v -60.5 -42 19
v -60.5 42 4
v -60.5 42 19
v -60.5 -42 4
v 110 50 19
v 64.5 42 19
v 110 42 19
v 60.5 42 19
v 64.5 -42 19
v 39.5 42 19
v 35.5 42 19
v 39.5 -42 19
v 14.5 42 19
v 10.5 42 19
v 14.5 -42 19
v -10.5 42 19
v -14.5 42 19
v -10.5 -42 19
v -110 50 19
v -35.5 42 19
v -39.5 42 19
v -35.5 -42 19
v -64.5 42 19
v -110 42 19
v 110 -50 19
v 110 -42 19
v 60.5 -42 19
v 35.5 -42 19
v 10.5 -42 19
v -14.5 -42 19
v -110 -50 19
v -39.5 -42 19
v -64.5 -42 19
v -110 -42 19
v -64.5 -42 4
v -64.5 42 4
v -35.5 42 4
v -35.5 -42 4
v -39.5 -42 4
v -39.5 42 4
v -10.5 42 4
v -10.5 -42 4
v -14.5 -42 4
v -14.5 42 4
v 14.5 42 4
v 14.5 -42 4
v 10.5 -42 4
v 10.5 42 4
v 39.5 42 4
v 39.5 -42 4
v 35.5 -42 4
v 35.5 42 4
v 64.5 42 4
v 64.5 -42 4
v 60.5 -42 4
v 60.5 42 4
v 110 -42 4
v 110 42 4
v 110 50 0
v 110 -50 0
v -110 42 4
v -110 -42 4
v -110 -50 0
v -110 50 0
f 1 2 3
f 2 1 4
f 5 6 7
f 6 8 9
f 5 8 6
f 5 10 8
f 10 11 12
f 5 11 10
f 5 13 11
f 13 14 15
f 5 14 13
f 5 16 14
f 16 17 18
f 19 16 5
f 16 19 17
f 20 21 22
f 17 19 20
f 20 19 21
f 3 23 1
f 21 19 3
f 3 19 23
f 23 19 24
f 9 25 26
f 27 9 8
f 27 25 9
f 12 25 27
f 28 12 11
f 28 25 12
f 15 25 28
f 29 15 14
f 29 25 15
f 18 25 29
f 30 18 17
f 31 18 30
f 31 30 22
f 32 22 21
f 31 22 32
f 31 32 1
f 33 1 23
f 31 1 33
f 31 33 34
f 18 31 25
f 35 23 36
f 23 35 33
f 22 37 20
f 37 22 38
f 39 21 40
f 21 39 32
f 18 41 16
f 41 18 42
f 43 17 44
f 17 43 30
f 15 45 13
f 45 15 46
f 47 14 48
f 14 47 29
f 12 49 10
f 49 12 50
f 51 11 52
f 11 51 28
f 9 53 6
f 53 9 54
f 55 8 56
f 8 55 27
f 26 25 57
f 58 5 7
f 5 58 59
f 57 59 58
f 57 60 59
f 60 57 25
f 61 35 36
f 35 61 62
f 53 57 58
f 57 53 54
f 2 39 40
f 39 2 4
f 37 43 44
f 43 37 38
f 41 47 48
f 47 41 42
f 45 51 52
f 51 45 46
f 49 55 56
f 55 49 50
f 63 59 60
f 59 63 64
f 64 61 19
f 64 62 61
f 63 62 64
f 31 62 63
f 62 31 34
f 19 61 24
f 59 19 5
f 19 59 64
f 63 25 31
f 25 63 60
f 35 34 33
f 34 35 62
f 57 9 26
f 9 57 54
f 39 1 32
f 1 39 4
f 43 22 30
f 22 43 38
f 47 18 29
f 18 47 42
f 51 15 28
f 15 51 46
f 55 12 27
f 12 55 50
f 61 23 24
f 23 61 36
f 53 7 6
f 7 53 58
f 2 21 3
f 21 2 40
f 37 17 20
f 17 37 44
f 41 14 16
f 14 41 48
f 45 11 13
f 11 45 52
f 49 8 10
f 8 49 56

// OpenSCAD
$fn = 32;

// ----------------------------------------------------------------------
// Rib frame 220 x 100 x 19
// 6 ribs at 25 mm pitch
// ----------------------------------------------------------------------

// --- parameters (mm) ---
frame = [220, 100, 4];  // base plate size (x, y, z)
rail_w = 8;             // side rail width
ribs = 6;               // number of ribs
rib_t = 4;              // rib thickness
rib_h = 15;             // rib height above the base plate
pitch = 25;             // pitch between rib centres

// --- derived feature positions (mm) ---
span = (ribs - 1) * pitch;          // = 125   distance between the outer ribs
origin_x = -span / 2;               // = -62.5   X of the first rib
rib_len = frame[1] - 2 * rail_w + 2;  // = 86   rib length, 1 mm into each rail
feature_centers = [
  [origin_x + 0 * pitch, 0],
  [origin_x + 1 * pitch, 0],
  [origin_x + 2 * pitch, 0],
  [origin_x + 3 * pitch, 0],
  [origin_x + 4 * pitch, 0],
  [origin_x + 5 * pitch, 0]
];   // rib centre line, drives the rib loop

// base plate, two side rails, then the ribs read straight off feature_centers
union() {
  translate([-frame[0] / 2, -frame[1] / 2, 0]) cube(frame);
  translate([-frame[0] / 2, -frame[1] / 2, 0]) cube([frame[0], rail_w, frame[2] + rib_h]);
  translate([-frame[0] / 2, frame[1] / 2 - rail_w, 0]) cube([frame[0], rail_w, frame[2] + rib_h]);
  for (centre = feature_centers)
    translate([centre[0] - rib_t / 2, centre[1] - rib_len / 2, frame[2] - 1])
      cube([rib_t, rib_len, rib_h + 1]);
}
